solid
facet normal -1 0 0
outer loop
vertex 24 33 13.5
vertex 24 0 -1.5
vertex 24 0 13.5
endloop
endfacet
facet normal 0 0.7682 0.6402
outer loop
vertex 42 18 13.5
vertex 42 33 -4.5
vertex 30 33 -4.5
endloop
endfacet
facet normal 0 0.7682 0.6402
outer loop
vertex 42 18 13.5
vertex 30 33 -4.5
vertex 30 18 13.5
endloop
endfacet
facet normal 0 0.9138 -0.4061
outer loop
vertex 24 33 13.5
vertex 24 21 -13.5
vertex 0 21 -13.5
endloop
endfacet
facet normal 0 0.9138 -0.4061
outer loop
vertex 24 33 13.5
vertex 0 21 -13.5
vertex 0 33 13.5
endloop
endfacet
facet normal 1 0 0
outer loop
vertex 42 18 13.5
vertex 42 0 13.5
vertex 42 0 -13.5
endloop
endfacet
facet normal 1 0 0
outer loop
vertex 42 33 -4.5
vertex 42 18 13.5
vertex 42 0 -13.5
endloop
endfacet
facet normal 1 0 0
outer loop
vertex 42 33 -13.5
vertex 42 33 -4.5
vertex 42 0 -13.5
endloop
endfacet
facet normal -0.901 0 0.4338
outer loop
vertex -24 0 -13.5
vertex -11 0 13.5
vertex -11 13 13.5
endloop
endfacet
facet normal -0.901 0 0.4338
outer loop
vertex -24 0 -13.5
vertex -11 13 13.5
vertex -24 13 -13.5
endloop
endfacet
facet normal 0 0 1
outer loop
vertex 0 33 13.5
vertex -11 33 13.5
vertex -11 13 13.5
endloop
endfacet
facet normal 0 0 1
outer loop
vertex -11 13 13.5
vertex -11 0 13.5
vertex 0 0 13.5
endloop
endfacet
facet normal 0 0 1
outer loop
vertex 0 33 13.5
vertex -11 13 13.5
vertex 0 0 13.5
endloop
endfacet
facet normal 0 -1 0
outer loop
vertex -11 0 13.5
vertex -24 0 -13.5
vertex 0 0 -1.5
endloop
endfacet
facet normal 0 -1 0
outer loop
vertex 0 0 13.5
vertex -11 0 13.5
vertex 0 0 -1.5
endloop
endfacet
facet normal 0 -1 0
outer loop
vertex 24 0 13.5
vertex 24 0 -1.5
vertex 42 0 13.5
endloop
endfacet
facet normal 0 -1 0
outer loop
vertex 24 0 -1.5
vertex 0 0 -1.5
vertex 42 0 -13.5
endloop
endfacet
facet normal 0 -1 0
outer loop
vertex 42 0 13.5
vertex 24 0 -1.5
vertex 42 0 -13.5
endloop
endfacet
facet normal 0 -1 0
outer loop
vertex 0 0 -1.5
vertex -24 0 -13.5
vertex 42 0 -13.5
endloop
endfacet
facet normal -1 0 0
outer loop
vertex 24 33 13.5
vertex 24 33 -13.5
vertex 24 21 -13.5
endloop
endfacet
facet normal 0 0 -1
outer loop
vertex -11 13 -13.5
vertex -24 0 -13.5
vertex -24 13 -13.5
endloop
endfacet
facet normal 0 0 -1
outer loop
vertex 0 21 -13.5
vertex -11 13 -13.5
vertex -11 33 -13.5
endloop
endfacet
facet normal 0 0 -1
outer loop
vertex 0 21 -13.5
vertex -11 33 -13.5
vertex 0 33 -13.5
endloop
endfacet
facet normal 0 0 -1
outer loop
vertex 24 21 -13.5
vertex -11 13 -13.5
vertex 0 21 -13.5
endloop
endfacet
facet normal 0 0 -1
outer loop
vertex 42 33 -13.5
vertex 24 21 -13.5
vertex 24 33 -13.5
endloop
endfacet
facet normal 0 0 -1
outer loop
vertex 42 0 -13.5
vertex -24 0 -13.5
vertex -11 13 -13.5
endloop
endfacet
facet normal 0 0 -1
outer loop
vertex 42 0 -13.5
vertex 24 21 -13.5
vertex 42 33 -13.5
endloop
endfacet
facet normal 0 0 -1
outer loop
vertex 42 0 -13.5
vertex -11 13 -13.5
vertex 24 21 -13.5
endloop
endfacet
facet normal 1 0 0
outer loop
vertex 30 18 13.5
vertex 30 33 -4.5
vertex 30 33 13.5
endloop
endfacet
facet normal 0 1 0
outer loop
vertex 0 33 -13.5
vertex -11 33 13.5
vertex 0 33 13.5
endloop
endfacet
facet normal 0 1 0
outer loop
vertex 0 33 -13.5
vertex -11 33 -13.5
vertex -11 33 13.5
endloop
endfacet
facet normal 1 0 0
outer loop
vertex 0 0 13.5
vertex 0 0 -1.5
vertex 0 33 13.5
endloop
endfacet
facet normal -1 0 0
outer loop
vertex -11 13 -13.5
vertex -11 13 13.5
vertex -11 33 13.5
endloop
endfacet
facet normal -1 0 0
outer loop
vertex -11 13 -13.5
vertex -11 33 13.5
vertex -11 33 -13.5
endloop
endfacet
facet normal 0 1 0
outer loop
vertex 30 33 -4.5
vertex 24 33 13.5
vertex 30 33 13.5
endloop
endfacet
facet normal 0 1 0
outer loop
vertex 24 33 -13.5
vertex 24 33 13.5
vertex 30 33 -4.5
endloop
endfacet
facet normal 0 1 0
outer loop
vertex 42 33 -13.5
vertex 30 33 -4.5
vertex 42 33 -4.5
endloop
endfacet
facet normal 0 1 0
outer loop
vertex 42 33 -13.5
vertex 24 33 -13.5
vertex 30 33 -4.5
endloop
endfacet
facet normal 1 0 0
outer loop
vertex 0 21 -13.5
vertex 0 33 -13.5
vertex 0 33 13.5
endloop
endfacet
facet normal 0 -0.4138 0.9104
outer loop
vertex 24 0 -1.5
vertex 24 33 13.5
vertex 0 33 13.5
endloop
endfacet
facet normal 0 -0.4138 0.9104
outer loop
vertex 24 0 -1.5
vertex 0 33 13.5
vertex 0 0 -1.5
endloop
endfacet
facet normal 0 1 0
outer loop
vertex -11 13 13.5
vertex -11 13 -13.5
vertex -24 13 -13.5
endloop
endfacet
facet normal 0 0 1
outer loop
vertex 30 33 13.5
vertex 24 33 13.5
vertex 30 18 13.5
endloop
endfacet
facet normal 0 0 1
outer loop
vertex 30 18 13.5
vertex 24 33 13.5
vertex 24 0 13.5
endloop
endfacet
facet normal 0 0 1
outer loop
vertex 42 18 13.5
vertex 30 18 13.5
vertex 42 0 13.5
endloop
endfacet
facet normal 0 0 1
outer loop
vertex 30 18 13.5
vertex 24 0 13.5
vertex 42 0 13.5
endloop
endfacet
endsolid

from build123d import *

# Parameters (mm, degrees)
SKETCH1_W             = 11
SKETCH1_H             = 27
BOSS_EXTRUDE1_DEPTH   = 33
SKETCH1_W_2           = 18
BOSS_EXTRUDE1_2_DEPTH = 33
BOSS_EXTRUDE2_DEPTH   = 13
SKETCH1_5_W           = 24
SKETCH1_5_H           = 27
BOSS_EXTRUDE4_DEPTH   = 33
CUT_EXTRUDE1_DEPTH    = 24
CUT_EXTRUDE2_DEPTH    = 12


with BuildPart() as part:
    # Sketch1 → Boss-Extrude1 (new body)
    with BuildSketch(Plane(origin=(0, 0, 0), x_dir=(1, 0, 0), z_dir=(0, 1, 0))):
        with Locations((-5.5, 0)):
            Rectangle(SKETCH1_W, SKETCH1_H)
    extrude(amount=BOSS_EXTRUDE1_DEPTH)

    # Sketch1<3> → Boss-Extrude2 (add)
    with BuildSketch(Plane(origin=(0, 0, 0), x_dir=(1, 0, 0), z_dir=(0, 1, 0))):
        Polygon((-24, 13.5), (-11, -13.5), (-11, 13.5), align=None)
    extrude(amount=BOSS_EXTRUDE2_DEPTH)



with BuildPart() as body_2:
    # Sketch1 → Boss-Extrude1 2 (new body)
    with BuildSketch(Plane(origin=(0, 0, 0), x_dir=(1, 0, 0), z_dir=(0, 1, 0))):
        with Locations((33, 0)):
            Rectangle(SKETCH1_W_2, SKETCH1_H)
    extrude(amount=BOSS_EXTRUDE1_2_DEPTH)


with BuildPart() as part_1:
    add(part.part)

    add(body_2.part)  # Boss-Extrude4 merges body 2
    # Sketch1<5> → Boss-Extrude4 (add)
    with BuildSketch(Plane(origin=(0, 0, 0), x_dir=(1, 0, 0), z_dir=(0, 1, 0))):
        with Locations((12, 0)):
            Rectangle(SKETCH1_5_W, SKETCH1_5_H)
    extrude(amount=BOSS_EXTRUDE4_DEPTH)

    # Sketch3 → Cut-Extrude1 (cut)
    with BuildSketch(Plane.ZY.offset(-24)):
        Polygon((13.5, 33), (-13.5, 33), (-13.5, 21), align=None)
        Polygon((13.5, 0), (13.5, 33), (-1.5, 0), align=None)
    extrude(amount=CUT_EXTRUDE1_DEPTH, mode=Mode.SUBTRACT)

    # Sketch4 → Cut-Extrude2 (cut)
    with BuildSketch(Plane(origin=(42, 0, 0), x_dir=(0, 0, -1), z_dir=(1, 0, 0))):
        Polygon((4.5, 33), (-13.5, 18), (-13.5, 33), align=None)
    extrude(amount=-CUT_EXTRUDE2_DEPTH, mode=Mode.SUBTRACT)


solid = part_1.part
